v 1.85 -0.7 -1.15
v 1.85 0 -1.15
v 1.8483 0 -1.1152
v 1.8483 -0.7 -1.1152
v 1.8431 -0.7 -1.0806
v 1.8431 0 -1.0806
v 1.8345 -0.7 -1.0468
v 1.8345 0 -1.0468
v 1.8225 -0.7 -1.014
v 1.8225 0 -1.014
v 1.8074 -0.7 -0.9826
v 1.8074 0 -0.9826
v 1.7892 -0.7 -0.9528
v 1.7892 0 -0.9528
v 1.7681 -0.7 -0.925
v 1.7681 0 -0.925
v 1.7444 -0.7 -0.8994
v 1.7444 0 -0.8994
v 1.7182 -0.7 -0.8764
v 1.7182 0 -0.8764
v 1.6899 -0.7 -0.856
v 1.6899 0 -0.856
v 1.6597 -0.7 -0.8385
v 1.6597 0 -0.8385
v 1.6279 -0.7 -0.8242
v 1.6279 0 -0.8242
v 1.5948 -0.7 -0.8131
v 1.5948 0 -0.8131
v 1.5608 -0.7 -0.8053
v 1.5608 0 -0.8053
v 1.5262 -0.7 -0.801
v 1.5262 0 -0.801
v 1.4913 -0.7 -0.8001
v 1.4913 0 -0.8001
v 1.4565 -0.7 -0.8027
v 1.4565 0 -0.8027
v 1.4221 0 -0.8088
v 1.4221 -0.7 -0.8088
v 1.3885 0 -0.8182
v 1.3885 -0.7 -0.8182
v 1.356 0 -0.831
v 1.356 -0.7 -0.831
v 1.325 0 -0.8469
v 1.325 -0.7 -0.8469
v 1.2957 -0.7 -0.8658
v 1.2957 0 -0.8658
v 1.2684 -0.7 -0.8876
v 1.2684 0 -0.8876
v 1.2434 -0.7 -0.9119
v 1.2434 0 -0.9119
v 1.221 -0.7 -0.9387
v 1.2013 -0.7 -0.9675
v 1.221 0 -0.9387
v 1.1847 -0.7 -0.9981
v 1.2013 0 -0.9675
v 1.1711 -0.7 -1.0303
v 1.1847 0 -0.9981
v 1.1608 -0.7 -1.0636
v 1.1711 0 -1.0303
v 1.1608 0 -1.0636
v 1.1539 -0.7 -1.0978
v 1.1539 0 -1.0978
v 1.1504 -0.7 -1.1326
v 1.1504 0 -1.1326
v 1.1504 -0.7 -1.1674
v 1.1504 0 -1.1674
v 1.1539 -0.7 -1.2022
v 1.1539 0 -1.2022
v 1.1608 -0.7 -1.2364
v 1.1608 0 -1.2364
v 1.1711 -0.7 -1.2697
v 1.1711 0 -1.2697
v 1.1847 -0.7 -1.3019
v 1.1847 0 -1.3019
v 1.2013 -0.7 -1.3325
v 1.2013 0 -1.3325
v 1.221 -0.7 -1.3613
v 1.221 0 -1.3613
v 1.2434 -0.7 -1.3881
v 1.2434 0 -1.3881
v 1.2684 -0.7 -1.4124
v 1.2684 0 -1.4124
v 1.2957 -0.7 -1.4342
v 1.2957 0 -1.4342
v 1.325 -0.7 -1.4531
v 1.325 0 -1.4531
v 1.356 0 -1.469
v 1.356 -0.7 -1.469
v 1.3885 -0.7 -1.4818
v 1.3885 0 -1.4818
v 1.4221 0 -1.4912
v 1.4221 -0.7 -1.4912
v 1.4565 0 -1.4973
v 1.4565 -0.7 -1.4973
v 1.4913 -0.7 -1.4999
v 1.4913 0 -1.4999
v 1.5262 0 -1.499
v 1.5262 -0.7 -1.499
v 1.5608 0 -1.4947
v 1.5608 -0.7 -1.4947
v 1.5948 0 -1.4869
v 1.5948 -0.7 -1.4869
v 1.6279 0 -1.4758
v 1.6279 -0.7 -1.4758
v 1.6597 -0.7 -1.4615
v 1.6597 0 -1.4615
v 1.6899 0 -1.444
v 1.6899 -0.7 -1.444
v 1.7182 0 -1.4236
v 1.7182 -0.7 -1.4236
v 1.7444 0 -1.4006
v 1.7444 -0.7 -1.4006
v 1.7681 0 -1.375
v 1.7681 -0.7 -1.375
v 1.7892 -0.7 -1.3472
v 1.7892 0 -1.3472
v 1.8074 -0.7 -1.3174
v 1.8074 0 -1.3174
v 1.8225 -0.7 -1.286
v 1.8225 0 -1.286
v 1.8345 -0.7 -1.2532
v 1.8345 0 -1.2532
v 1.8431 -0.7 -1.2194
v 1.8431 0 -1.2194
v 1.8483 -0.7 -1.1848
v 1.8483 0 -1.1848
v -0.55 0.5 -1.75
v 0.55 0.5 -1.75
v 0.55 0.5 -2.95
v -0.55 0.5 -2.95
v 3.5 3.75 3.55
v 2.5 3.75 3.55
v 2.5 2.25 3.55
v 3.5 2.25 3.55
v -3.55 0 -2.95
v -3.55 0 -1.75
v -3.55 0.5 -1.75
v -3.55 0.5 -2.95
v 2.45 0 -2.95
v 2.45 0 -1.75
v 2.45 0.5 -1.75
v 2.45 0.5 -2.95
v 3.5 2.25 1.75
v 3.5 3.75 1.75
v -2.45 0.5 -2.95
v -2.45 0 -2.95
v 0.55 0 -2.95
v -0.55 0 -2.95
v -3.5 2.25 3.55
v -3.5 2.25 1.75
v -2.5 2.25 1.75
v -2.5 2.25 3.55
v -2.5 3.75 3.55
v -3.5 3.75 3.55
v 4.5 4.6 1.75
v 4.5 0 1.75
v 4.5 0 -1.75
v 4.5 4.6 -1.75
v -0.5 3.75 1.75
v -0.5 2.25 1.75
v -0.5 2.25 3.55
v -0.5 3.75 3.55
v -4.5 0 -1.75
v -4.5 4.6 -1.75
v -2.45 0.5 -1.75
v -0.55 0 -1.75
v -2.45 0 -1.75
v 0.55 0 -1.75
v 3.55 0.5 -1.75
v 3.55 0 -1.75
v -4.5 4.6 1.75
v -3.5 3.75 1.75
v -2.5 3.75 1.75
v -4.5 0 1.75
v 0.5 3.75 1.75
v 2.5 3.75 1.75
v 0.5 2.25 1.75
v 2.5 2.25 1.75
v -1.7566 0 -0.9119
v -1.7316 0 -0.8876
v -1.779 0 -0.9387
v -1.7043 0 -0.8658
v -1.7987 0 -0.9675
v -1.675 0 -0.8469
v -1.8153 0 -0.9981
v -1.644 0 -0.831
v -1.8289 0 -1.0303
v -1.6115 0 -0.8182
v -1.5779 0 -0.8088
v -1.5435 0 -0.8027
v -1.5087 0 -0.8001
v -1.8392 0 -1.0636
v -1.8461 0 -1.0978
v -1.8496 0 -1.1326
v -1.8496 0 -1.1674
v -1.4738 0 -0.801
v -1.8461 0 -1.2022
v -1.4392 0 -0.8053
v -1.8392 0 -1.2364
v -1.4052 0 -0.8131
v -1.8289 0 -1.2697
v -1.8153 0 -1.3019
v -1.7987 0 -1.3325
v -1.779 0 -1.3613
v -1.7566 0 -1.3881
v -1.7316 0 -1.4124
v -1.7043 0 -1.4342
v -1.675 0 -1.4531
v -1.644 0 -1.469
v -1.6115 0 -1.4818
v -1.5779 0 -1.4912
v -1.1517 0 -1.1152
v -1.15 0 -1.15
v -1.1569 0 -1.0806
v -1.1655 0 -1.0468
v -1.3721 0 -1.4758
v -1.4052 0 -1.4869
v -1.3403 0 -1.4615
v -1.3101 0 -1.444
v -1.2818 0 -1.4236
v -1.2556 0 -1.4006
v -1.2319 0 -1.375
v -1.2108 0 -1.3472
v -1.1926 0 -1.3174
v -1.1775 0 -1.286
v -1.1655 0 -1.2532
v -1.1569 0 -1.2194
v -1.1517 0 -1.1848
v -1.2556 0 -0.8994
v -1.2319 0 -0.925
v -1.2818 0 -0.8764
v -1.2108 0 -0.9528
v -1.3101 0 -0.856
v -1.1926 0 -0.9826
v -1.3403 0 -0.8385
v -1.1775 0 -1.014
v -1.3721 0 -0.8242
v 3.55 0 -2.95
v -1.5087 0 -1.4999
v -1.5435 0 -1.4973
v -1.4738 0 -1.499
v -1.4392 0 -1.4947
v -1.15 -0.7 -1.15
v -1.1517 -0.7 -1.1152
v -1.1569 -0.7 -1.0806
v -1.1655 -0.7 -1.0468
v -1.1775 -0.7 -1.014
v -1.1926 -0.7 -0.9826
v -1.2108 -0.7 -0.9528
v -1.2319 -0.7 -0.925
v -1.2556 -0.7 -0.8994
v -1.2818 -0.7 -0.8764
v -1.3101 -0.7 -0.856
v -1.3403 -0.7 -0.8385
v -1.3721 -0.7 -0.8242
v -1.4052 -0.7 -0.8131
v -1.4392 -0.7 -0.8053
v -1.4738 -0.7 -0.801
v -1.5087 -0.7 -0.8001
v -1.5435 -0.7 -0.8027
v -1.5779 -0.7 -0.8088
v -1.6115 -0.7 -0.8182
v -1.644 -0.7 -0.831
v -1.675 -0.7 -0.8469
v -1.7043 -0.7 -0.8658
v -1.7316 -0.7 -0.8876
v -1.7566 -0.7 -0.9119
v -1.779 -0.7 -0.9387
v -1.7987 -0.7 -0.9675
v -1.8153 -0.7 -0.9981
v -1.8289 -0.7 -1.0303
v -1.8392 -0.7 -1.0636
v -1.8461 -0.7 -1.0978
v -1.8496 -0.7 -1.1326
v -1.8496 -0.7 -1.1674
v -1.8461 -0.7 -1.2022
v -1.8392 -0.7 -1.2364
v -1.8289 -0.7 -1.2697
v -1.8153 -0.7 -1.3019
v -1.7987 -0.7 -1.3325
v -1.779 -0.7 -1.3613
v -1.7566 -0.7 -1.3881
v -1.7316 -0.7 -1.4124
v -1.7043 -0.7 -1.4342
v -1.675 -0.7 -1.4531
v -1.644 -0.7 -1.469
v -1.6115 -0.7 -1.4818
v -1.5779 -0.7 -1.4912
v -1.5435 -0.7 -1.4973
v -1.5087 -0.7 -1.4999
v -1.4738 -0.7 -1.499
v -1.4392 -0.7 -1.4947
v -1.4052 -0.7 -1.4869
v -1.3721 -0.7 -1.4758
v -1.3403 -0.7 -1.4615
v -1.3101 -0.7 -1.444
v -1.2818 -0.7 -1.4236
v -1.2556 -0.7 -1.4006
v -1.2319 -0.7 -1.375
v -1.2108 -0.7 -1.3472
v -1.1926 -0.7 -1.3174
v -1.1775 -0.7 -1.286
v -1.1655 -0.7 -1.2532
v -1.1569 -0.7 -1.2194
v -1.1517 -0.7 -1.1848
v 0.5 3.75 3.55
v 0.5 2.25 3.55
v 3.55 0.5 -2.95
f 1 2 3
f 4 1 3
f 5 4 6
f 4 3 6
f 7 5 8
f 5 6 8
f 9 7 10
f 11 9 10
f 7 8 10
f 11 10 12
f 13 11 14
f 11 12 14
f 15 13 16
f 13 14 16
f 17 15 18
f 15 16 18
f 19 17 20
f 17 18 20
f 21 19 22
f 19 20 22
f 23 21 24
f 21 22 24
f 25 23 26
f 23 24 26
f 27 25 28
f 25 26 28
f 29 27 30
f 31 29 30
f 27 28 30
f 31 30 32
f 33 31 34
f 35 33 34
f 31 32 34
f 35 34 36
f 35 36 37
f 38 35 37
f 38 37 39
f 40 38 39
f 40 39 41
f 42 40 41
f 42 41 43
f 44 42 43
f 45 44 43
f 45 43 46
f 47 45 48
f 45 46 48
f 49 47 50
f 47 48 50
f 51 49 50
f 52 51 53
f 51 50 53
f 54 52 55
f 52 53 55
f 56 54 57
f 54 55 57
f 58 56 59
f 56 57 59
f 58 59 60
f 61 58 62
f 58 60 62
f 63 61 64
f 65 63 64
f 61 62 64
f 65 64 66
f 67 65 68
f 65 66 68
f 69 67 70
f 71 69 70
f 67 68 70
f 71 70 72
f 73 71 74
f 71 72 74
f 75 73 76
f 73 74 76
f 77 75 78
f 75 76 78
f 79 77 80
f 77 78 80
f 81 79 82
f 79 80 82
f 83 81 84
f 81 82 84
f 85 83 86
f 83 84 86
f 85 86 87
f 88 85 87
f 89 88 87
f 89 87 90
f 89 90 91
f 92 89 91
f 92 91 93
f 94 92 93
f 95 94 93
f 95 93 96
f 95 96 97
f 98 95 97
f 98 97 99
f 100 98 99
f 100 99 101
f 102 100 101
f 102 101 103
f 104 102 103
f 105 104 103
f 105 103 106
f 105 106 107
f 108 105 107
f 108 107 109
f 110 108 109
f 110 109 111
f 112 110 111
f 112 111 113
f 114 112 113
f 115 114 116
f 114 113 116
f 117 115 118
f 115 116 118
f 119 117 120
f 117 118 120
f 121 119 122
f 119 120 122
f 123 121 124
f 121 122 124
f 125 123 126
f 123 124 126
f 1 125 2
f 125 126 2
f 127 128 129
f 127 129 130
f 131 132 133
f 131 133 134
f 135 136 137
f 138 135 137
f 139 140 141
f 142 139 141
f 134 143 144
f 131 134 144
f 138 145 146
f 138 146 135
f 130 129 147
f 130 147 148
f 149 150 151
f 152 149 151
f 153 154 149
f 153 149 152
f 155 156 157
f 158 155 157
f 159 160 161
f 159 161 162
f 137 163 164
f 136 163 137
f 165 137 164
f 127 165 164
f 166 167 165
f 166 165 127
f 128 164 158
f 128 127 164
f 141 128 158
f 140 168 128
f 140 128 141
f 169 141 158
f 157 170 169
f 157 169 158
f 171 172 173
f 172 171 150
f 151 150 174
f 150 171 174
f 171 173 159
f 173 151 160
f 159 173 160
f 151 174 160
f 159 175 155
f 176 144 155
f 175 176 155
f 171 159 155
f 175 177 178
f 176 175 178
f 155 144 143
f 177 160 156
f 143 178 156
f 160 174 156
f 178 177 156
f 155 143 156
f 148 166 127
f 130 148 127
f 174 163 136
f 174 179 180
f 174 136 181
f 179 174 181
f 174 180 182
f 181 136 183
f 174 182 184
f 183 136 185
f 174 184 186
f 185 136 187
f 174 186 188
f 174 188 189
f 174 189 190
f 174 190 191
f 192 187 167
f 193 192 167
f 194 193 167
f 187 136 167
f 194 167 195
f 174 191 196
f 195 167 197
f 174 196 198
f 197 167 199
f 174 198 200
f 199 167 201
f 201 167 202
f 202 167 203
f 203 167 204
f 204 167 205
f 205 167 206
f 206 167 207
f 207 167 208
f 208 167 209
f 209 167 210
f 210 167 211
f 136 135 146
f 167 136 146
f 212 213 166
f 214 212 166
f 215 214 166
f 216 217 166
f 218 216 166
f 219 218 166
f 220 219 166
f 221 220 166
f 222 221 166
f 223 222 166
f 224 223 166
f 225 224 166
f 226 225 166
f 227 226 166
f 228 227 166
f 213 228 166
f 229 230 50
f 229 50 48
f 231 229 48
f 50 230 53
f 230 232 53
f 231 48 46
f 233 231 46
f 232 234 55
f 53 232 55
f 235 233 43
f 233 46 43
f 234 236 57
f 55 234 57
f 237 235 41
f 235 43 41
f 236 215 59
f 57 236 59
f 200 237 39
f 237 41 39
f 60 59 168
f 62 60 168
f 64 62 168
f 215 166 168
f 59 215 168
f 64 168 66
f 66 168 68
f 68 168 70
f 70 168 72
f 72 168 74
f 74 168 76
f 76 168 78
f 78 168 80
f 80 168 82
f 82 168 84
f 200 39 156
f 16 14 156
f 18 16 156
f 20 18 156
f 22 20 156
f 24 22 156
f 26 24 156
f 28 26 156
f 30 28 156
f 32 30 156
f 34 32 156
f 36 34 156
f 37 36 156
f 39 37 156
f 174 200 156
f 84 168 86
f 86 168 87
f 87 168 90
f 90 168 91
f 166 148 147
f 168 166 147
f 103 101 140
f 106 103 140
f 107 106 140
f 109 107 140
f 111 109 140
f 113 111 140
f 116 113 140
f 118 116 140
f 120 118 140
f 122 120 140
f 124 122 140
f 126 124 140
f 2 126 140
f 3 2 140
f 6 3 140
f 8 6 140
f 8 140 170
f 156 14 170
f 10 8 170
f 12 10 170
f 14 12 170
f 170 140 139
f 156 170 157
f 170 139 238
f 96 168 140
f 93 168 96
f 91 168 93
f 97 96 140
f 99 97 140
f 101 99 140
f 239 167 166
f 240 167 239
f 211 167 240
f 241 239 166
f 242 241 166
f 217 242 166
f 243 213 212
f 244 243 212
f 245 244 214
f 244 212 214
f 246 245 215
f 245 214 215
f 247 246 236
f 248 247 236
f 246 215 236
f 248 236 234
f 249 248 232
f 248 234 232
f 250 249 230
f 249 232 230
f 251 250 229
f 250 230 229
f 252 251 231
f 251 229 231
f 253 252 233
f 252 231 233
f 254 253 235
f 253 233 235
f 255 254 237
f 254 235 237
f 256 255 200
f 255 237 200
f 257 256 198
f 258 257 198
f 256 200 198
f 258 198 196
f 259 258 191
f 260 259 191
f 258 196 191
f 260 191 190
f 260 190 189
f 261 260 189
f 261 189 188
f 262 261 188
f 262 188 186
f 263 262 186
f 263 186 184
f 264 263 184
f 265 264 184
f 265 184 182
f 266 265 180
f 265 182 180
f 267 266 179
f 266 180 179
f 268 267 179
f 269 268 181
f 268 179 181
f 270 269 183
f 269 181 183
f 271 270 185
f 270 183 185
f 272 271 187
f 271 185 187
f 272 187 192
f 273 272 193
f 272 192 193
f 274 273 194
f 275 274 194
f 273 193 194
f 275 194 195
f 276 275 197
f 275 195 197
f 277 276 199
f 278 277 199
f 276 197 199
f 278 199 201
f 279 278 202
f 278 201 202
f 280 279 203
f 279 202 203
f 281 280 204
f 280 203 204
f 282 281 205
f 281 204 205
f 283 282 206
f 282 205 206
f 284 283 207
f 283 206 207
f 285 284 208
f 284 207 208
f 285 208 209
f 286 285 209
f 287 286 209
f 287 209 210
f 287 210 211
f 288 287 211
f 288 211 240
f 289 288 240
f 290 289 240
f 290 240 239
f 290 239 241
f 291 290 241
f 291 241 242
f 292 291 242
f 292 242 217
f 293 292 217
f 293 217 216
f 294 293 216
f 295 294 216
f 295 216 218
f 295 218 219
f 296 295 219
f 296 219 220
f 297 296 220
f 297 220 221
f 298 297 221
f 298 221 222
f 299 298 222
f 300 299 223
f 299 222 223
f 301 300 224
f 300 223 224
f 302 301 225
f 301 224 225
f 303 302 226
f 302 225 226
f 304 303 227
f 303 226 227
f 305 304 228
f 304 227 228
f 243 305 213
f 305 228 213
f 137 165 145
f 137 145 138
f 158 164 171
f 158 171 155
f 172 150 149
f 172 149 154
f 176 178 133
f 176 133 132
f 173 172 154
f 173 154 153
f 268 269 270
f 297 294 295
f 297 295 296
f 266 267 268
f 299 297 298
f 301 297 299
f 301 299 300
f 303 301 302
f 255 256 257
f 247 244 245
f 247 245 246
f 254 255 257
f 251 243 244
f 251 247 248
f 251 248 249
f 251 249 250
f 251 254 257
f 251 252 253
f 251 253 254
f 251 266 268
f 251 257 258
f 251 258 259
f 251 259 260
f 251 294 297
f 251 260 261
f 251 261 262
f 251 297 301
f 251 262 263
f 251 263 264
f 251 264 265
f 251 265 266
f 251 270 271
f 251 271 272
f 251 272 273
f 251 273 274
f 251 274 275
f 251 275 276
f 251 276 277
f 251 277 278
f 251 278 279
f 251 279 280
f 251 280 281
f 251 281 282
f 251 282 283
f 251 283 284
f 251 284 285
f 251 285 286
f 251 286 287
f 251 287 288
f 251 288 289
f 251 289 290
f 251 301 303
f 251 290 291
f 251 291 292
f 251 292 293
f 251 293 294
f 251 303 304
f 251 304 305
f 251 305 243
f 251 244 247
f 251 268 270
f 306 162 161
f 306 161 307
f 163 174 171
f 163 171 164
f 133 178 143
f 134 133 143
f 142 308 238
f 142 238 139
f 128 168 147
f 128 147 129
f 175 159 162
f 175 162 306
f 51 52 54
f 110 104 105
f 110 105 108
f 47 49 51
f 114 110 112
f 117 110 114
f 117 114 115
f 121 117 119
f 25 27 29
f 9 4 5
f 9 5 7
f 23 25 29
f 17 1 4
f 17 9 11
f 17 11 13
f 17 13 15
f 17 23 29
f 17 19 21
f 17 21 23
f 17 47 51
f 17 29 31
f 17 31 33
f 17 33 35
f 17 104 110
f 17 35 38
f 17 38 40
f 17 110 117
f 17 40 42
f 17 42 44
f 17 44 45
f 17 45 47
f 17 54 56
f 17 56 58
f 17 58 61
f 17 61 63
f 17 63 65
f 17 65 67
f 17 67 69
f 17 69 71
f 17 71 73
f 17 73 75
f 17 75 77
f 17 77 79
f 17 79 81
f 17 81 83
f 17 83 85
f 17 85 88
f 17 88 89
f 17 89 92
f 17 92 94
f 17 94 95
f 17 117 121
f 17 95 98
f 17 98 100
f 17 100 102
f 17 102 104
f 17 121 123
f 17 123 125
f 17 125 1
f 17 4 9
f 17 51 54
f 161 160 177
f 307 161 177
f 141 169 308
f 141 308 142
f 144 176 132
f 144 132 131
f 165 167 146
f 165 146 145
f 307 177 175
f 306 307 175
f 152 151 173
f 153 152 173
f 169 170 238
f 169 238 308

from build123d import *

# Parameters (mm, degrees)
SKETCH1_W            = 9
SKETCH1_H            = 3.5
BOSS_EXTRUDE1_DEPTH  = 4.6
SKETCH2_W            = 1
SKETCH2_H            = 1.5
BOSS_EXTRUDE2_DEPTH  = 1.8
LPATTERN1_COUNT      = 2
LPATTERN1_PITCH      = 3
LPATTERN1_COUNT_DIR2 = 2
LPATTERN1_PITCH_DIR2 = 3
SKETCH5_R            = 0.35
BOSS_EXTRUDE4_DEPTH  = 0.7
SKETCH3_W            = 1.1
SKETCH3_H            = 0.5
BOSS_EXTRUDE3_DEPTH  = 1.2
LPATTERN2_COUNT      = 2
LPATTERN2_PITCH      = 3
LPATTERN2_COL_COUNT  = 2
LPATTERN2_COL_PITCH  = 3


with BuildPart() as part:
    # Sketch1 → Boss-Extrude1 (new body)
    with BuildSketch(Plane(origin=(0, 0, 0), x_dir=(1, 0, 0), z_dir=(0, 1, 0))):
        Rectangle(SKETCH1_W, SKETCH1_H)
    extrude(amount=BOSS_EXTRUDE1_DEPTH)

    # Sketch2 → Boss-Extrude2 (add)
    with BuildSketch(Plane.XY.offset(1.75)):
        with Locations((0, 3)):
            Rectangle(SKETCH2_W, SKETCH2_H)
    boss_extrude2 = extrude(amount=BOSS_EXTRUDE2_DEPTH)

    # LPattern1: Boss-Extrude2 2 × 2
    with Locations(*[Vector(1, 0, 0) * (i * LPATTERN1_PITCH) + Vector(-1, 0, 0) * (j * LPATTERN1_PITCH_DIR2) for i in range(LPATTERN1_COUNT) for j in range(LPATTERN1_COUNT_DIR2) if (i, j) != (0, 0)]):
        add(boss_extrude2)

    # Sketch5 → Boss-Extrude4 (add)
    with BuildSketch(Plane.XZ):
        with Locations((-1.5, -1.15)):
            Circle(SKETCH5_R)
        with Locations((1.5, -1.15)):
            Circle(SKETCH5_R)
    extrude(amount=BOSS_EXTRUDE4_DEPTH)

    # Sketch3 → Boss-Extrude3 (add)
    with BuildSketch(Plane(origin=(0, 0, -1.75), x_dir=(-1, 0, 0), z_dir=(0, 0, -1))):
        with Locations((0, 0.25)):
            Rectangle(SKETCH3_W, SKETCH3_H)
    boss_extrude3 = extrude(amount=BOSS_EXTRUDE3_DEPTH)

    # LPattern2: Boss-Extrude3 ×2
    with Locations(*[(i * LPATTERN2_PITCH, 0, 0) for i in range(1, LPATTERN2_COUNT)]):
        add(boss_extrude3)

    # LPattern2 col: Boss-Extrude3 ×2
    with Locations(*[(-i * LPATTERN2_COL_PITCH, 0, 0) for i in range(1, LPATTERN2_COL_COUNT)]):
        add(boss_extrude3)


solid = part.part
